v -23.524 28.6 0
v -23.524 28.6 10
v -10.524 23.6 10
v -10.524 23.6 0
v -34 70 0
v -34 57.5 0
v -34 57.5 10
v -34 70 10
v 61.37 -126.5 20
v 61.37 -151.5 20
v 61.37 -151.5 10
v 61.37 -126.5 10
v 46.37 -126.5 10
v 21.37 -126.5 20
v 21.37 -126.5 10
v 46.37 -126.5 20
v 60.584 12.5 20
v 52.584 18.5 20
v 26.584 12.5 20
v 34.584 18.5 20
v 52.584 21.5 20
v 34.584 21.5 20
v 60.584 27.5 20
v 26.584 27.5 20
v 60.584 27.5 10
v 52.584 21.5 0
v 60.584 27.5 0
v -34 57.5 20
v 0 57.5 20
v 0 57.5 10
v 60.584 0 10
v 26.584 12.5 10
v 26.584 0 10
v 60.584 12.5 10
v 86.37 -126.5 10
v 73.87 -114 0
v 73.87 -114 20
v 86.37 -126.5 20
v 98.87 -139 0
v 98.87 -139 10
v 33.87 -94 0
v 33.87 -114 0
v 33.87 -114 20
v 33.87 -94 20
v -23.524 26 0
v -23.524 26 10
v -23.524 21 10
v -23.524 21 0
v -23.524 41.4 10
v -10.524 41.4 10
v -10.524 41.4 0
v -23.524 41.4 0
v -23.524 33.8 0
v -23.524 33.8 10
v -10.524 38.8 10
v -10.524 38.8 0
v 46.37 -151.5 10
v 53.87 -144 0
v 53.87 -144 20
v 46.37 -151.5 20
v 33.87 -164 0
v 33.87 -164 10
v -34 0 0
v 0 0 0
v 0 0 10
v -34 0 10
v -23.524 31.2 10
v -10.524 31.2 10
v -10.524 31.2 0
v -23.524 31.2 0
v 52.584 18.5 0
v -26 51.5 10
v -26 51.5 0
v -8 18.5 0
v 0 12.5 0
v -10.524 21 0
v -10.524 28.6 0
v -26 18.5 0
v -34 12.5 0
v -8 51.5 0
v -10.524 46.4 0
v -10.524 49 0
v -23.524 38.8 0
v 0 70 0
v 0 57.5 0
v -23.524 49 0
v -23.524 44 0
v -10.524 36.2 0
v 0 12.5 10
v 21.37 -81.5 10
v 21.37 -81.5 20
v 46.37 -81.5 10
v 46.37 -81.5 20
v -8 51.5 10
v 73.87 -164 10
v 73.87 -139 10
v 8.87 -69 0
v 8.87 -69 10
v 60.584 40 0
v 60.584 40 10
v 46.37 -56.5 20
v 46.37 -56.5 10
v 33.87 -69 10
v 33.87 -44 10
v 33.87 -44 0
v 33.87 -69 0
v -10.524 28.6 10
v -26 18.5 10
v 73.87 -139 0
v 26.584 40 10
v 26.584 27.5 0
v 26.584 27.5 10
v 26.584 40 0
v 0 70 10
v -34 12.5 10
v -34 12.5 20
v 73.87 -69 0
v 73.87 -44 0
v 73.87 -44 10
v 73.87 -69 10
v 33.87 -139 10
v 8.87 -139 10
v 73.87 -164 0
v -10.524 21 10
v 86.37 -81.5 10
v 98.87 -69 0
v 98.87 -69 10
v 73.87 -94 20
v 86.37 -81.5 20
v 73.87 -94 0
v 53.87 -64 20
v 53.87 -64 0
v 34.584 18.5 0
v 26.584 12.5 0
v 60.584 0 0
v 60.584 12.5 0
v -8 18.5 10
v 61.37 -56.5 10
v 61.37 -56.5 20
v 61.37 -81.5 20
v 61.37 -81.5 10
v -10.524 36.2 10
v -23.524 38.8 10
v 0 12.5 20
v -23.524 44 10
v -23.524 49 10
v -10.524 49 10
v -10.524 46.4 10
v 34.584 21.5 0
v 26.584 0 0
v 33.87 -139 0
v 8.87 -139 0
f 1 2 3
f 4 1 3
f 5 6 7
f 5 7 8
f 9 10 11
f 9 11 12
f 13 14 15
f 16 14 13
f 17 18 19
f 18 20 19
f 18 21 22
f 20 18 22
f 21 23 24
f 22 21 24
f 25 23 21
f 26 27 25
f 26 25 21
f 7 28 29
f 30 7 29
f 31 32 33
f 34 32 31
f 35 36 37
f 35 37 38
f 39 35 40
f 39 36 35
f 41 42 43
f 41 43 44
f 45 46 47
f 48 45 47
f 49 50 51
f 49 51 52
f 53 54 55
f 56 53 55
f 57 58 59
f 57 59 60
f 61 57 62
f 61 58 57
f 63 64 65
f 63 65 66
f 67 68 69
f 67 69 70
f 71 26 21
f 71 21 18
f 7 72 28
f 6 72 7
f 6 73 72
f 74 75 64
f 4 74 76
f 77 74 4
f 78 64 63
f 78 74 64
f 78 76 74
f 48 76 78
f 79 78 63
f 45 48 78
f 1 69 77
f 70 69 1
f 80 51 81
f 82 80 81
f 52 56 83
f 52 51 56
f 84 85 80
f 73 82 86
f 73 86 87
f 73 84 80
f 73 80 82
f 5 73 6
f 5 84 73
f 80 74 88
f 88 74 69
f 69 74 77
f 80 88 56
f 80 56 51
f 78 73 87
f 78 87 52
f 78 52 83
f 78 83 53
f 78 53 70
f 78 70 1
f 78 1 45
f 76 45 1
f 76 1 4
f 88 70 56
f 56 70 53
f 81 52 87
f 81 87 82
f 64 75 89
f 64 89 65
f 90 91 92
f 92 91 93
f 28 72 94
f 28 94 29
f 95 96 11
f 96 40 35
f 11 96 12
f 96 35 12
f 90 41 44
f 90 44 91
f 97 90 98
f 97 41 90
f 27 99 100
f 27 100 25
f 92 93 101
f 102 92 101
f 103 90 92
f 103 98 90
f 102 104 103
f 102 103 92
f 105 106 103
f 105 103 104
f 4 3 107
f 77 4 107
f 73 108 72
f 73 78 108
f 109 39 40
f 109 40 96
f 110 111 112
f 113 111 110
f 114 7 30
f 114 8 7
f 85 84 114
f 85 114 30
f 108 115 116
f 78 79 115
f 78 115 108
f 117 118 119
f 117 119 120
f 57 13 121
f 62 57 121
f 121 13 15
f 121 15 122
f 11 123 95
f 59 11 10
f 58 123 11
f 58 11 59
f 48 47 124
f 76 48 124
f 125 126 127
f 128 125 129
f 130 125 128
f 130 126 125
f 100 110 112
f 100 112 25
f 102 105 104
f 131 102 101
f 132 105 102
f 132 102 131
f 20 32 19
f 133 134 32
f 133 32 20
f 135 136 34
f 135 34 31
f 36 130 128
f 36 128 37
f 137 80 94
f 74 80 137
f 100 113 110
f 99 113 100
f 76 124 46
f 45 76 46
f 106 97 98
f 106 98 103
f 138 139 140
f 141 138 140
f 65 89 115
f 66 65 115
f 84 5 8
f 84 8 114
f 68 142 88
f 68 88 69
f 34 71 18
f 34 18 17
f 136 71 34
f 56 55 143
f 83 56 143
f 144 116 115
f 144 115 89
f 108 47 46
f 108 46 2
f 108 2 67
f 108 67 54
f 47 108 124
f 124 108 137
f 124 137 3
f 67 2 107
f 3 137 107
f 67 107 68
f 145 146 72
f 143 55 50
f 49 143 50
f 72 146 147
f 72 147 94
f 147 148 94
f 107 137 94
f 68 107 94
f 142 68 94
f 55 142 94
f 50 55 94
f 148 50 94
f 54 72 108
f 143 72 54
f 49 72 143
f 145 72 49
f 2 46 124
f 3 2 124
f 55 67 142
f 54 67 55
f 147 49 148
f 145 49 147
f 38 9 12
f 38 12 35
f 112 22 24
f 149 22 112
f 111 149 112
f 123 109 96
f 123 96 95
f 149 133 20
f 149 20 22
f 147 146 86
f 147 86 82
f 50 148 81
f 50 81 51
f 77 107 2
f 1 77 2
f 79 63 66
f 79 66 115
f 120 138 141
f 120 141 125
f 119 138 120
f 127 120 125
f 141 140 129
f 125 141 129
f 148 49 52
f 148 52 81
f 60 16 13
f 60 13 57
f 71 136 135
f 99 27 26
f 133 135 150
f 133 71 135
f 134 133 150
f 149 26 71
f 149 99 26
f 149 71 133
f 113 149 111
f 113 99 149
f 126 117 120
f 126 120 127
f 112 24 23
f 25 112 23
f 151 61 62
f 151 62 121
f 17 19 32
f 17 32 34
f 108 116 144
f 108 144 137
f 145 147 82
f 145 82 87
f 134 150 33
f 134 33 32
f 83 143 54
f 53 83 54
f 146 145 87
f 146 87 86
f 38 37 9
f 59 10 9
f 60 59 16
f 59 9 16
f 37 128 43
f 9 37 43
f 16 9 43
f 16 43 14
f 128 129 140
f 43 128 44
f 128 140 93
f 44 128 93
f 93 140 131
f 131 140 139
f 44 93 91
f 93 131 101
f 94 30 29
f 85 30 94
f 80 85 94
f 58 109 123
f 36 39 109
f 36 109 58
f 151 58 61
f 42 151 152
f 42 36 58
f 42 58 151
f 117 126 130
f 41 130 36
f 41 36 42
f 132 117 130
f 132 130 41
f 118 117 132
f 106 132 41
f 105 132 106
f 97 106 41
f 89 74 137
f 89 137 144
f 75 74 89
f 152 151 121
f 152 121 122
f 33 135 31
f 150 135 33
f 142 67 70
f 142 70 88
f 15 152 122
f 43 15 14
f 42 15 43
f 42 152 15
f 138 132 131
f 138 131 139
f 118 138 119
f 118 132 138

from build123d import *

# Parameters (mm, degrees)
PAD_DEPTH       = 20
POCKET_DEPTH    = 10
POCKET001_DEPTH = 10
POCKET005_DEPTH = 40
POCKET006_DEPTH = 10.001
PAD001_DEPTH    = 20
SKETCH010_W     = 34
SKETCH010_H     = 12.5
SKETCH010_W_2   = 34.000042
POCKET007_DEPTH = 10
PAD002_DEPTH    = 20
POCKET003_DEPTH = 10
POCKET004_DEPTH = 10


with BuildPart() as body:
    # Sketch → Pad (new body)
    with BuildSketch(Plane.XY):
        Polygon((-33.999986, 70), (1.4e-05, 70), (1.4e-05, 57.5), (-7.999979, 51.499991), (-7.999979, 18.499972), (4.2e-05, 12.5), (0, 0), (-34, 0), (-34, 12.5), (-25.999979, 18.499972), (-25.999979, 51.499991), (-33.999972, 57.5), align=None)
    extrude(amount=PAD_DEPTH)

    # Sketch003 (on Face14 of Pad) → Pocket (cut)
    with BuildSketch(Plane.XY.offset(20)):
        Polygon((-34, 12.5), (4.2e-05, 12.5), (0, 0), (-34, 0), align=None)
    extrude(amount=-POCKET_DEPTH, mode=Mode.SUBTRACT)

    # Sketch004 (on Face5 of Pocket) → Pocket001 (cut)
    with BuildSketch(Plane.XY.offset(20)):
        Polygon((-33.999972, 57.5), (1.4e-05, 57.5), (1.4e-05, 70), (-33.999986, 70), align=None)
    extrude(amount=-POCKET001_DEPTH, mode=Mode.SUBTRACT)

    # Sketch008 (on Face8 of Pocket001) → Pocket005 (cut)
    with BuildSketch(Plane.YZ.offset(2.000021)):
        Polygon((12.5, 20), (18.5, 10), (51.5, 10), (57.5, 20), align=None)
    extrude(amount=-POCKET005_DEPTH, mode=Mode.SUBTRACT)

    # Sketch009 (on Face16 of Pocket005) → Pocket006 (cut, through all)
    with BuildSketch(Plane.XY.offset(10)):
        Polygon((-23.523946, 26), (-23.523946, 21), (-10.523946, 21), align=None)
        Polygon((-23.523946, 28.6), (-10.523946, 23.6), (-10.523946, 28.6), align=None)
        Polygon((-23.523946, 49), (-10.523946, 49), (-23.523946, 44), align=None)
        Polygon((-23.523946, 41.4), (-10.523946, 46.4), (-10.523946, 41.4), align=None)
        Polygon((-23.523946, 38.8), (-23.523946, 33.8), (-10.523946, 38.8), align=None)
        Polygon((-23.523946, 31.2), (-10.523946, 36.2), (-10.523946, 31.2), align=None)
    extrude(amount=-POCKET006_DEPTH, mode=Mode.SUBTRACT)


with BuildPart() as i2_4cm:
    # Sketch001 → Pad001 (new body)
    with BuildSketch(Plane.XY):
        Polygon((-33.999986, 40), (1.4e-05, 40), (1.4e-05, 27.5), (-7.999979, 21.499991), (-7.999979, 18.499972), (4.2e-05, 12.5), (0, 0), (-34, 0), (-34, 12.5), (-25.999979, 18.499972), (-25.999979, 21.499991), (-33.999972, 27.5), align=None)
    extrude(amount=PAD001_DEPTH)

    # Sketch010 (on Face14 of Pad001) → Pocket007 (cut)
    with BuildSketch(Plane.XY.offset(20)):
        with Locations((-16.999986, 33.75)):
            Rectangle(SKETCH010_W, SKETCH010_H)
        with Locations((-16.999979, 6.25)):
            Rectangle(SKETCH010_W_2, SKETCH010_H)
    extrude(amount=-POCKET007_DEPTH, mode=Mode.SUBTRACT)


with BuildPart() as i2_4cm_1:
    # Body001 placement: moved
    add(i2_4cm.part.moved(Location((60.5835, 0, 0))))


with BuildPart() as star:
    # Sketch002 → Pad002 (new body)
    with BuildSketch(Plane.XY):
        Polygon((33.87, -44), (53.87, -64), (73.87, -44), (73.87, -69), (98.87, -69), (73.87, -94), (73.87, -114), (98.87, -139), (73.87, -139), (73.87, -164), (53.87, -144), (33.87, -164), (33.87, -139), (8.87, -139), (33.87, -114), (33.87, -94), (8.87, -69), (33.87, -69), align=None)
    extrude(amount=PAD002_DEPTH)

    # Sketch006 (on Face20 of Pad002) → Pocket003 (cut)
    with BuildSketch(Plane.XY.offset(20)):
        Polygon((21.37, -126.5), (46.37, -126.5), (46.37, -151.5), (33.87, -164), (33.87, -139), (8.87, -139), align=None)
        Polygon((21.37, -81.5), (46.37, -81.5), (46.37, -56.5), (33.87, -44), (33.87, -69), (8.87, -69), align=None)
        Polygon((73.87, -44), (61.37, -56.5), (61.37, -81.5), (86.37, -81.5), (98.87, -69), (73.87, -69), align=None)
    extrude(amount=-POCKET003_DEPTH, mode=Mode.SUBTRACT)

    # Sketch007 (on Face23 of Pocket003) → Pocket004 (cut)
    with BuildSketch(Plane.XY.offset(20)):
        Polygon((61.37, -151.5), (61.37, -126.5), (86.37, -126.5), (98.87, -139), (73.87, -139), (73.87, -164), align=None)
    extrude(amount=-POCKET004_DEPTH, mode=Mode.SUBTRACT)


solid = Compound([body.part, i2_4cm_1.part, star.part])
